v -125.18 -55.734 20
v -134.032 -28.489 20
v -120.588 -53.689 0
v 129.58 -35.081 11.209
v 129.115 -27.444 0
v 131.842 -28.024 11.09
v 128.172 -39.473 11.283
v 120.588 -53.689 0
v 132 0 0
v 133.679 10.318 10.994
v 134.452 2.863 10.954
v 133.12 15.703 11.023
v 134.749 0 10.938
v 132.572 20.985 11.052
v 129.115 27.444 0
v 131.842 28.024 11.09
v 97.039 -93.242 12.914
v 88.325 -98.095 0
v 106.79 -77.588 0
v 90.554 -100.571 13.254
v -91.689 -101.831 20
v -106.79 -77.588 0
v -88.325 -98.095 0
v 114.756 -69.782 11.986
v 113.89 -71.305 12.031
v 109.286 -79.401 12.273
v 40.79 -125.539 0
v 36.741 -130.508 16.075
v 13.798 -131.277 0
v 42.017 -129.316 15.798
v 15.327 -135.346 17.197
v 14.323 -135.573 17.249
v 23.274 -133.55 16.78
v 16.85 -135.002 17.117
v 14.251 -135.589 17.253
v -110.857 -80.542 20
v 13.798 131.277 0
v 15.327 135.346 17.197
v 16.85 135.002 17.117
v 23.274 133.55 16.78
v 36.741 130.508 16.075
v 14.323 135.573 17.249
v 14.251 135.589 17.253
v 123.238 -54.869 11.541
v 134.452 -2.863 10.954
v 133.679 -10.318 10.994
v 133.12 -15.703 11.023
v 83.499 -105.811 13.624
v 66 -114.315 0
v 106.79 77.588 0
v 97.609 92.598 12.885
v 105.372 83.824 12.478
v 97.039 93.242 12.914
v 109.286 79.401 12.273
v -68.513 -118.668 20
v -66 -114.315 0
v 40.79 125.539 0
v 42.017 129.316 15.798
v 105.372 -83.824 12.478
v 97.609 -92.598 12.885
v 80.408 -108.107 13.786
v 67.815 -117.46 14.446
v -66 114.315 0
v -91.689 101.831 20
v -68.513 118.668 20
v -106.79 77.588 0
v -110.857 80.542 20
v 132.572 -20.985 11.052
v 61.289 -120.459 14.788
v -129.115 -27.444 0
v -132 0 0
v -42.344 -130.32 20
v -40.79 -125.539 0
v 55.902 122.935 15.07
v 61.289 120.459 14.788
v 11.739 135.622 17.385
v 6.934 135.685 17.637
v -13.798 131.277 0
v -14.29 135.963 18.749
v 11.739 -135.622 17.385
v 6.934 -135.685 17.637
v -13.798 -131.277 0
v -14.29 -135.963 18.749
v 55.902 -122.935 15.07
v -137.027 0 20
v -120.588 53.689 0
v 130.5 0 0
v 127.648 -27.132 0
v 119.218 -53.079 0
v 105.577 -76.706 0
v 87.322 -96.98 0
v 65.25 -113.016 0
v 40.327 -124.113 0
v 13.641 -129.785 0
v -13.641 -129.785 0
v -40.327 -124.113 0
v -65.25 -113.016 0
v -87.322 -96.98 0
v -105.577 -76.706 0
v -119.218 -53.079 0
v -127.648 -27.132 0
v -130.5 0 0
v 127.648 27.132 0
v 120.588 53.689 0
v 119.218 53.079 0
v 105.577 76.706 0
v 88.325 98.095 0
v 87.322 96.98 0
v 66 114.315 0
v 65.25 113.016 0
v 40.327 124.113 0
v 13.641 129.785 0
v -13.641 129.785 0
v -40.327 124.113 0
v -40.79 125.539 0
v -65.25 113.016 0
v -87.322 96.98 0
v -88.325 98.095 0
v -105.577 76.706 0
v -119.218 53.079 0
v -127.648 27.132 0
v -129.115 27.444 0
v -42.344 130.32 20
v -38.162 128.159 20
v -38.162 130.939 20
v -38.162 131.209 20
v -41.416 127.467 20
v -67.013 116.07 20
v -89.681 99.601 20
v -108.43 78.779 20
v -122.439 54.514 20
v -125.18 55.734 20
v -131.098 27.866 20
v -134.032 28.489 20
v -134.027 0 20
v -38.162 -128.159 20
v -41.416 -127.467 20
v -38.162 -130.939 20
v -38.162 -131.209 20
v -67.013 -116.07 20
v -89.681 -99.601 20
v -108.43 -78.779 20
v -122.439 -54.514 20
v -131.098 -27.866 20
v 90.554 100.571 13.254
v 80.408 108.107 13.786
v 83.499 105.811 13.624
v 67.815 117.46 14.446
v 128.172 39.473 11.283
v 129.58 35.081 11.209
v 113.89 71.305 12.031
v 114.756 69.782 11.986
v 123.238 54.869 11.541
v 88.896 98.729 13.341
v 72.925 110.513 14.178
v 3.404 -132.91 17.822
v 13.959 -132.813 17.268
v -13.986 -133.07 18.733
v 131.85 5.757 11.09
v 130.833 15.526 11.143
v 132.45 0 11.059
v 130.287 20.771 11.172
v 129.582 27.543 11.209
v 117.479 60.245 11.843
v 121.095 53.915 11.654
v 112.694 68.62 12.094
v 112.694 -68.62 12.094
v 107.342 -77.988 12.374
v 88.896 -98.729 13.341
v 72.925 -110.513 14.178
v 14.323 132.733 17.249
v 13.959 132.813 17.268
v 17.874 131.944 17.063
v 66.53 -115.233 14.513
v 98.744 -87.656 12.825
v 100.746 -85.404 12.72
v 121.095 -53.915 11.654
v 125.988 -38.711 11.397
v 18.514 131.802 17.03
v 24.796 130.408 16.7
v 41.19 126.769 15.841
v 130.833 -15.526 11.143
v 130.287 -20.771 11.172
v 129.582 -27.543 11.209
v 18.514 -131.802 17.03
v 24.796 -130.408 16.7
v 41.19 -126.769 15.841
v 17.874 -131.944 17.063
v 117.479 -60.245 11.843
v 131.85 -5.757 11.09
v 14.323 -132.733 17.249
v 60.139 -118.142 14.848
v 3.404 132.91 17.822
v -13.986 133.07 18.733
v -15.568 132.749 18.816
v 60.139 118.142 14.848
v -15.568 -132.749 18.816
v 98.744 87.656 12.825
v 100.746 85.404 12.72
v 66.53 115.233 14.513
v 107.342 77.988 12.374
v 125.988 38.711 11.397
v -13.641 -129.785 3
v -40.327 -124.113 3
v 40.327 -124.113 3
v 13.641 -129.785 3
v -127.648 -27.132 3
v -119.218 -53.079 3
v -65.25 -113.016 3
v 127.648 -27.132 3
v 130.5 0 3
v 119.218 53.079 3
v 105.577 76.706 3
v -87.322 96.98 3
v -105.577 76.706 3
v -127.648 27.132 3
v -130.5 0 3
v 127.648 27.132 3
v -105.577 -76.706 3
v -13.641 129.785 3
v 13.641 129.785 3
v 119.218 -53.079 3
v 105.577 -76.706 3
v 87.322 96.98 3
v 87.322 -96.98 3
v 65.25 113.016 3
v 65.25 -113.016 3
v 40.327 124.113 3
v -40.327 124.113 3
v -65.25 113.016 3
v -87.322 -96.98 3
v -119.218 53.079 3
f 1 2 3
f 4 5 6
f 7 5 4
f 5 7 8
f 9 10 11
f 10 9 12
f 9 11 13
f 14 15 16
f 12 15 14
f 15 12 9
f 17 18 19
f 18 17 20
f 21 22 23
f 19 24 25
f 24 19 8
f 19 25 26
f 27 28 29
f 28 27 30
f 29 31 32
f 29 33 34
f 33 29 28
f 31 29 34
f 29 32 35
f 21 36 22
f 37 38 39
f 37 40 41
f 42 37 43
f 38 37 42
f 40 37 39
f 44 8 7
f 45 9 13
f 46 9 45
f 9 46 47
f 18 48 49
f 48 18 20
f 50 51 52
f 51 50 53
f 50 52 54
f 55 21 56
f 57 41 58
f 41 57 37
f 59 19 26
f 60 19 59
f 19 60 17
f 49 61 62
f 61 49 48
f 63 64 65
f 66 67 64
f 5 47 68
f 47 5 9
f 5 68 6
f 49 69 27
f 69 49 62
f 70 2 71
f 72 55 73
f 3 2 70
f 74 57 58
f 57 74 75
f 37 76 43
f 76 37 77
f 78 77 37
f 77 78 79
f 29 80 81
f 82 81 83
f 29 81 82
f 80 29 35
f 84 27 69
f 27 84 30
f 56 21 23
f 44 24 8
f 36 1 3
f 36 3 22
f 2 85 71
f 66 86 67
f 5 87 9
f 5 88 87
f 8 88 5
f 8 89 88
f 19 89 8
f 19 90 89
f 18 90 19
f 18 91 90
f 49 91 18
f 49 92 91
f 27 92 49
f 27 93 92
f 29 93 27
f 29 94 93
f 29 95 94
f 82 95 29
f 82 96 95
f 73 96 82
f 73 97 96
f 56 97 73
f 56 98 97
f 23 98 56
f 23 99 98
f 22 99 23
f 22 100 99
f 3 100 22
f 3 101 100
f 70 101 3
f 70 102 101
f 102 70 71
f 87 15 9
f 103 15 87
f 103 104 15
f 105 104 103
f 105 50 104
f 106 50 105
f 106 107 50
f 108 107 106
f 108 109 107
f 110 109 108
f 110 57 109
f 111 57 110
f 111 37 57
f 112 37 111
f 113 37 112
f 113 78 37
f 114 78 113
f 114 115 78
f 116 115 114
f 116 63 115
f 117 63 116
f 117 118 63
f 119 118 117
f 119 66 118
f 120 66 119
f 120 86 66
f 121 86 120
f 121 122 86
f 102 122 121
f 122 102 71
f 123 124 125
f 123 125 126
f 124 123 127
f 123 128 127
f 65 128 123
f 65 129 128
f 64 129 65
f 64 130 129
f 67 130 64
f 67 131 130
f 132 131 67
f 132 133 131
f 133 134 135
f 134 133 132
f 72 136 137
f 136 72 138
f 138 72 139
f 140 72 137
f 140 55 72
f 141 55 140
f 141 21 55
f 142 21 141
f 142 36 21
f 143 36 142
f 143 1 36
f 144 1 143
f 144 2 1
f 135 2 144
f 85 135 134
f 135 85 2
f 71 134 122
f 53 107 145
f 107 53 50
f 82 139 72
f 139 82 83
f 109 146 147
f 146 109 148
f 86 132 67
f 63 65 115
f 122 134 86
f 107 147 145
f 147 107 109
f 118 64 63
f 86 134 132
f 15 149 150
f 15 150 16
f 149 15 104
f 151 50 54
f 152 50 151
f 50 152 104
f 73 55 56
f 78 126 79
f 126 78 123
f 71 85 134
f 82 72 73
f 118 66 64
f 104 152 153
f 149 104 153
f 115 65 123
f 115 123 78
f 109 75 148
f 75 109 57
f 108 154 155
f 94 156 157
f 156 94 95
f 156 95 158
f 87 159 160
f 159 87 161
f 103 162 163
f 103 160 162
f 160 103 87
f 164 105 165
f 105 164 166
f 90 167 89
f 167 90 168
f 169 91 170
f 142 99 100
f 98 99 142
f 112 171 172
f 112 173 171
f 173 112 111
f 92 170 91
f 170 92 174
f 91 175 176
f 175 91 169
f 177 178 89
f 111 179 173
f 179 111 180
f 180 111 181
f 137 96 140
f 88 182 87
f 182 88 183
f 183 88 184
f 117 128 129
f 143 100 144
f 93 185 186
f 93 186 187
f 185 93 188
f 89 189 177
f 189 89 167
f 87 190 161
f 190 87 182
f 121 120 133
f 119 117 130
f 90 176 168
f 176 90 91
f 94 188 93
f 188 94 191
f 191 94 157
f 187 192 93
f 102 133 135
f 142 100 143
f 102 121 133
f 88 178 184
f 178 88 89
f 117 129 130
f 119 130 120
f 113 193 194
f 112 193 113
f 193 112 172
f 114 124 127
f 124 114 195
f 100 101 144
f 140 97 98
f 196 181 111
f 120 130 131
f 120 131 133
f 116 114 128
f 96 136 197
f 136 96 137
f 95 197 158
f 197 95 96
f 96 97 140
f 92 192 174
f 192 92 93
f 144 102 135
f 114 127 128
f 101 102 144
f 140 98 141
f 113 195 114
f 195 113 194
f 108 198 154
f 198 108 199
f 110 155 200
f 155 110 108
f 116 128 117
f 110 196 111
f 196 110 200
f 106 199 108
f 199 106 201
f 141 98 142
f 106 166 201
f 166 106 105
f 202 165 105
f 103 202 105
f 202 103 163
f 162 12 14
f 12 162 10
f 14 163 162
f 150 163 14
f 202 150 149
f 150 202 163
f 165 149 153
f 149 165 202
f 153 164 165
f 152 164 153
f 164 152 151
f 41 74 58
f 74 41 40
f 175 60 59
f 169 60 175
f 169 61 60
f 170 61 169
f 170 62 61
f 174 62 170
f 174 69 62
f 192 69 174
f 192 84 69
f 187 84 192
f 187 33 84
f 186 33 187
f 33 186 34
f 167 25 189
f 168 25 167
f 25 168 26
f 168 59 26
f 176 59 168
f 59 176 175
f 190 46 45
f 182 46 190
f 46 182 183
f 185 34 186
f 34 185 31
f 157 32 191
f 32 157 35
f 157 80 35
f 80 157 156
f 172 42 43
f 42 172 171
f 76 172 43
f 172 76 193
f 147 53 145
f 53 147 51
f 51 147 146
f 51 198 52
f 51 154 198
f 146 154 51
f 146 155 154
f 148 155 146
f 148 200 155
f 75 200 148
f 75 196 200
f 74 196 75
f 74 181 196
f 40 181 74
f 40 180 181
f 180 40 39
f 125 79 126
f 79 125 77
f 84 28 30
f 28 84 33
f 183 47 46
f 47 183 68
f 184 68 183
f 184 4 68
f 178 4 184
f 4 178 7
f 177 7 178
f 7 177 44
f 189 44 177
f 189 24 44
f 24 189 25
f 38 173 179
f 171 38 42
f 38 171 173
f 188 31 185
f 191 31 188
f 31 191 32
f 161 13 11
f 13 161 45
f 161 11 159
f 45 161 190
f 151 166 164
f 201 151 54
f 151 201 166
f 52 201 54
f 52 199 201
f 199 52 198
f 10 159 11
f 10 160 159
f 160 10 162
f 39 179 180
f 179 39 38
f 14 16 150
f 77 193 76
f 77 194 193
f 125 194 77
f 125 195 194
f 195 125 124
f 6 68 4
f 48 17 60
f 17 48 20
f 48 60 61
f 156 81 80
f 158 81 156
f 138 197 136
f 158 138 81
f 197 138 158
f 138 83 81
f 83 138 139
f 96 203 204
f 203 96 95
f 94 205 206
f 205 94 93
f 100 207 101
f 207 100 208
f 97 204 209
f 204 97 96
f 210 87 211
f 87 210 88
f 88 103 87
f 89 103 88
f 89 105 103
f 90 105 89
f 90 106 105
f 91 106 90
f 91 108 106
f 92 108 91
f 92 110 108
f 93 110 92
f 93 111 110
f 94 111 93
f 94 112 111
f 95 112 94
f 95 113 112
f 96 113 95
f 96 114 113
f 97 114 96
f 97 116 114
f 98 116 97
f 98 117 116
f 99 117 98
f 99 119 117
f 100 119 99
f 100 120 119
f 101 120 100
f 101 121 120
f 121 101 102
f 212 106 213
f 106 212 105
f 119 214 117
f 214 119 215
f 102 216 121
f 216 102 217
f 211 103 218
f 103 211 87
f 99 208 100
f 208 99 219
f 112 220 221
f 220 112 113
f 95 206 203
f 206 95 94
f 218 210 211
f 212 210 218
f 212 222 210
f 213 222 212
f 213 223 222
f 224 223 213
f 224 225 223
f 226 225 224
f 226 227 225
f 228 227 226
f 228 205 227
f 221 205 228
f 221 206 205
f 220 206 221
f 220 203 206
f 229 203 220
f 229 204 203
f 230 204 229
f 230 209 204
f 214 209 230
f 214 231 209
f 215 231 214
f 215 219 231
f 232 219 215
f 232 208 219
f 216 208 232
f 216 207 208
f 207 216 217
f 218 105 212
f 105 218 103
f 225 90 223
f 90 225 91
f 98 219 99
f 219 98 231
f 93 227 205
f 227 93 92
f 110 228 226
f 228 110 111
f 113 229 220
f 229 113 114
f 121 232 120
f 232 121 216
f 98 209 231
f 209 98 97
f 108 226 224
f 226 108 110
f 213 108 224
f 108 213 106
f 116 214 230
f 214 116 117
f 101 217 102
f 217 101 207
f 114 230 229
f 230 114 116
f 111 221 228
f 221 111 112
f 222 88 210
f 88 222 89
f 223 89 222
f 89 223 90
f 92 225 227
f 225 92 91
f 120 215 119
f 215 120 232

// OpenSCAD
// First end to end project
maindustcapplate();

module maindustcapplate()
{
    mainplatethickness = 3;
    tubediameter = 255;
    mainplatediameter = tubediameter+2*mainplatethickness;
    elpaneldiameter = 250;
    colerettelength = 20;
    colerettethickness = mainplatethickness;
    coleretteangledegree = 10;
    cablepassthroughdiameter  = 2;
    supportspacing = 50;
    supportlengthinplate = tubediameter*0.67;
    supportlengthoutofplate = 50;
    
    // define main plate base
    mainplate( internaldiameter=mainplatediameter, thickness=mainplatethickness);
    
    // define collerette
    colerette(internaldiameter=mainplatediameter, thickness=colerettethickness, length=colerettelength, angledegree=coleretteangledegree);
    
    // supporting arm
    //supportingarm()
}


module mainplate(internaldiameter, thickness)
{
    // define main plate base
    cylinder( r=internaldiameter/2, h=thickness, center=false);
}


module colerette(internaldiameter, thickness, length, angledegree)
{
    internalradius = internaldiameter/2;
    internaradius2 = internalradius+length*tan(angledegree);
    
    externalradius = (internaldiameter+thickness)/2;
    externalradius2 = internaradius2+thickness;
    
    heihtatorigin = length*0.9;
    cutangle = 3;

    difference()
    {
        // external
        cylinder(r1=externalradius, r2=externalradius2, h=length, center=false);
        // internal
        cylinder(r1=internalradius, r2=internaradius2, h=length, center=false);
        //cylinder(r=1, h=1, center=false);
        //cylinder(r=1, h=1, center=false);
        translate([0,0,heihtatorigin]) rotate([0,cutangle,0]) cylinder(r=externalradius2/cos(cutangle), h=length/cos(cutangle));
    }
}
